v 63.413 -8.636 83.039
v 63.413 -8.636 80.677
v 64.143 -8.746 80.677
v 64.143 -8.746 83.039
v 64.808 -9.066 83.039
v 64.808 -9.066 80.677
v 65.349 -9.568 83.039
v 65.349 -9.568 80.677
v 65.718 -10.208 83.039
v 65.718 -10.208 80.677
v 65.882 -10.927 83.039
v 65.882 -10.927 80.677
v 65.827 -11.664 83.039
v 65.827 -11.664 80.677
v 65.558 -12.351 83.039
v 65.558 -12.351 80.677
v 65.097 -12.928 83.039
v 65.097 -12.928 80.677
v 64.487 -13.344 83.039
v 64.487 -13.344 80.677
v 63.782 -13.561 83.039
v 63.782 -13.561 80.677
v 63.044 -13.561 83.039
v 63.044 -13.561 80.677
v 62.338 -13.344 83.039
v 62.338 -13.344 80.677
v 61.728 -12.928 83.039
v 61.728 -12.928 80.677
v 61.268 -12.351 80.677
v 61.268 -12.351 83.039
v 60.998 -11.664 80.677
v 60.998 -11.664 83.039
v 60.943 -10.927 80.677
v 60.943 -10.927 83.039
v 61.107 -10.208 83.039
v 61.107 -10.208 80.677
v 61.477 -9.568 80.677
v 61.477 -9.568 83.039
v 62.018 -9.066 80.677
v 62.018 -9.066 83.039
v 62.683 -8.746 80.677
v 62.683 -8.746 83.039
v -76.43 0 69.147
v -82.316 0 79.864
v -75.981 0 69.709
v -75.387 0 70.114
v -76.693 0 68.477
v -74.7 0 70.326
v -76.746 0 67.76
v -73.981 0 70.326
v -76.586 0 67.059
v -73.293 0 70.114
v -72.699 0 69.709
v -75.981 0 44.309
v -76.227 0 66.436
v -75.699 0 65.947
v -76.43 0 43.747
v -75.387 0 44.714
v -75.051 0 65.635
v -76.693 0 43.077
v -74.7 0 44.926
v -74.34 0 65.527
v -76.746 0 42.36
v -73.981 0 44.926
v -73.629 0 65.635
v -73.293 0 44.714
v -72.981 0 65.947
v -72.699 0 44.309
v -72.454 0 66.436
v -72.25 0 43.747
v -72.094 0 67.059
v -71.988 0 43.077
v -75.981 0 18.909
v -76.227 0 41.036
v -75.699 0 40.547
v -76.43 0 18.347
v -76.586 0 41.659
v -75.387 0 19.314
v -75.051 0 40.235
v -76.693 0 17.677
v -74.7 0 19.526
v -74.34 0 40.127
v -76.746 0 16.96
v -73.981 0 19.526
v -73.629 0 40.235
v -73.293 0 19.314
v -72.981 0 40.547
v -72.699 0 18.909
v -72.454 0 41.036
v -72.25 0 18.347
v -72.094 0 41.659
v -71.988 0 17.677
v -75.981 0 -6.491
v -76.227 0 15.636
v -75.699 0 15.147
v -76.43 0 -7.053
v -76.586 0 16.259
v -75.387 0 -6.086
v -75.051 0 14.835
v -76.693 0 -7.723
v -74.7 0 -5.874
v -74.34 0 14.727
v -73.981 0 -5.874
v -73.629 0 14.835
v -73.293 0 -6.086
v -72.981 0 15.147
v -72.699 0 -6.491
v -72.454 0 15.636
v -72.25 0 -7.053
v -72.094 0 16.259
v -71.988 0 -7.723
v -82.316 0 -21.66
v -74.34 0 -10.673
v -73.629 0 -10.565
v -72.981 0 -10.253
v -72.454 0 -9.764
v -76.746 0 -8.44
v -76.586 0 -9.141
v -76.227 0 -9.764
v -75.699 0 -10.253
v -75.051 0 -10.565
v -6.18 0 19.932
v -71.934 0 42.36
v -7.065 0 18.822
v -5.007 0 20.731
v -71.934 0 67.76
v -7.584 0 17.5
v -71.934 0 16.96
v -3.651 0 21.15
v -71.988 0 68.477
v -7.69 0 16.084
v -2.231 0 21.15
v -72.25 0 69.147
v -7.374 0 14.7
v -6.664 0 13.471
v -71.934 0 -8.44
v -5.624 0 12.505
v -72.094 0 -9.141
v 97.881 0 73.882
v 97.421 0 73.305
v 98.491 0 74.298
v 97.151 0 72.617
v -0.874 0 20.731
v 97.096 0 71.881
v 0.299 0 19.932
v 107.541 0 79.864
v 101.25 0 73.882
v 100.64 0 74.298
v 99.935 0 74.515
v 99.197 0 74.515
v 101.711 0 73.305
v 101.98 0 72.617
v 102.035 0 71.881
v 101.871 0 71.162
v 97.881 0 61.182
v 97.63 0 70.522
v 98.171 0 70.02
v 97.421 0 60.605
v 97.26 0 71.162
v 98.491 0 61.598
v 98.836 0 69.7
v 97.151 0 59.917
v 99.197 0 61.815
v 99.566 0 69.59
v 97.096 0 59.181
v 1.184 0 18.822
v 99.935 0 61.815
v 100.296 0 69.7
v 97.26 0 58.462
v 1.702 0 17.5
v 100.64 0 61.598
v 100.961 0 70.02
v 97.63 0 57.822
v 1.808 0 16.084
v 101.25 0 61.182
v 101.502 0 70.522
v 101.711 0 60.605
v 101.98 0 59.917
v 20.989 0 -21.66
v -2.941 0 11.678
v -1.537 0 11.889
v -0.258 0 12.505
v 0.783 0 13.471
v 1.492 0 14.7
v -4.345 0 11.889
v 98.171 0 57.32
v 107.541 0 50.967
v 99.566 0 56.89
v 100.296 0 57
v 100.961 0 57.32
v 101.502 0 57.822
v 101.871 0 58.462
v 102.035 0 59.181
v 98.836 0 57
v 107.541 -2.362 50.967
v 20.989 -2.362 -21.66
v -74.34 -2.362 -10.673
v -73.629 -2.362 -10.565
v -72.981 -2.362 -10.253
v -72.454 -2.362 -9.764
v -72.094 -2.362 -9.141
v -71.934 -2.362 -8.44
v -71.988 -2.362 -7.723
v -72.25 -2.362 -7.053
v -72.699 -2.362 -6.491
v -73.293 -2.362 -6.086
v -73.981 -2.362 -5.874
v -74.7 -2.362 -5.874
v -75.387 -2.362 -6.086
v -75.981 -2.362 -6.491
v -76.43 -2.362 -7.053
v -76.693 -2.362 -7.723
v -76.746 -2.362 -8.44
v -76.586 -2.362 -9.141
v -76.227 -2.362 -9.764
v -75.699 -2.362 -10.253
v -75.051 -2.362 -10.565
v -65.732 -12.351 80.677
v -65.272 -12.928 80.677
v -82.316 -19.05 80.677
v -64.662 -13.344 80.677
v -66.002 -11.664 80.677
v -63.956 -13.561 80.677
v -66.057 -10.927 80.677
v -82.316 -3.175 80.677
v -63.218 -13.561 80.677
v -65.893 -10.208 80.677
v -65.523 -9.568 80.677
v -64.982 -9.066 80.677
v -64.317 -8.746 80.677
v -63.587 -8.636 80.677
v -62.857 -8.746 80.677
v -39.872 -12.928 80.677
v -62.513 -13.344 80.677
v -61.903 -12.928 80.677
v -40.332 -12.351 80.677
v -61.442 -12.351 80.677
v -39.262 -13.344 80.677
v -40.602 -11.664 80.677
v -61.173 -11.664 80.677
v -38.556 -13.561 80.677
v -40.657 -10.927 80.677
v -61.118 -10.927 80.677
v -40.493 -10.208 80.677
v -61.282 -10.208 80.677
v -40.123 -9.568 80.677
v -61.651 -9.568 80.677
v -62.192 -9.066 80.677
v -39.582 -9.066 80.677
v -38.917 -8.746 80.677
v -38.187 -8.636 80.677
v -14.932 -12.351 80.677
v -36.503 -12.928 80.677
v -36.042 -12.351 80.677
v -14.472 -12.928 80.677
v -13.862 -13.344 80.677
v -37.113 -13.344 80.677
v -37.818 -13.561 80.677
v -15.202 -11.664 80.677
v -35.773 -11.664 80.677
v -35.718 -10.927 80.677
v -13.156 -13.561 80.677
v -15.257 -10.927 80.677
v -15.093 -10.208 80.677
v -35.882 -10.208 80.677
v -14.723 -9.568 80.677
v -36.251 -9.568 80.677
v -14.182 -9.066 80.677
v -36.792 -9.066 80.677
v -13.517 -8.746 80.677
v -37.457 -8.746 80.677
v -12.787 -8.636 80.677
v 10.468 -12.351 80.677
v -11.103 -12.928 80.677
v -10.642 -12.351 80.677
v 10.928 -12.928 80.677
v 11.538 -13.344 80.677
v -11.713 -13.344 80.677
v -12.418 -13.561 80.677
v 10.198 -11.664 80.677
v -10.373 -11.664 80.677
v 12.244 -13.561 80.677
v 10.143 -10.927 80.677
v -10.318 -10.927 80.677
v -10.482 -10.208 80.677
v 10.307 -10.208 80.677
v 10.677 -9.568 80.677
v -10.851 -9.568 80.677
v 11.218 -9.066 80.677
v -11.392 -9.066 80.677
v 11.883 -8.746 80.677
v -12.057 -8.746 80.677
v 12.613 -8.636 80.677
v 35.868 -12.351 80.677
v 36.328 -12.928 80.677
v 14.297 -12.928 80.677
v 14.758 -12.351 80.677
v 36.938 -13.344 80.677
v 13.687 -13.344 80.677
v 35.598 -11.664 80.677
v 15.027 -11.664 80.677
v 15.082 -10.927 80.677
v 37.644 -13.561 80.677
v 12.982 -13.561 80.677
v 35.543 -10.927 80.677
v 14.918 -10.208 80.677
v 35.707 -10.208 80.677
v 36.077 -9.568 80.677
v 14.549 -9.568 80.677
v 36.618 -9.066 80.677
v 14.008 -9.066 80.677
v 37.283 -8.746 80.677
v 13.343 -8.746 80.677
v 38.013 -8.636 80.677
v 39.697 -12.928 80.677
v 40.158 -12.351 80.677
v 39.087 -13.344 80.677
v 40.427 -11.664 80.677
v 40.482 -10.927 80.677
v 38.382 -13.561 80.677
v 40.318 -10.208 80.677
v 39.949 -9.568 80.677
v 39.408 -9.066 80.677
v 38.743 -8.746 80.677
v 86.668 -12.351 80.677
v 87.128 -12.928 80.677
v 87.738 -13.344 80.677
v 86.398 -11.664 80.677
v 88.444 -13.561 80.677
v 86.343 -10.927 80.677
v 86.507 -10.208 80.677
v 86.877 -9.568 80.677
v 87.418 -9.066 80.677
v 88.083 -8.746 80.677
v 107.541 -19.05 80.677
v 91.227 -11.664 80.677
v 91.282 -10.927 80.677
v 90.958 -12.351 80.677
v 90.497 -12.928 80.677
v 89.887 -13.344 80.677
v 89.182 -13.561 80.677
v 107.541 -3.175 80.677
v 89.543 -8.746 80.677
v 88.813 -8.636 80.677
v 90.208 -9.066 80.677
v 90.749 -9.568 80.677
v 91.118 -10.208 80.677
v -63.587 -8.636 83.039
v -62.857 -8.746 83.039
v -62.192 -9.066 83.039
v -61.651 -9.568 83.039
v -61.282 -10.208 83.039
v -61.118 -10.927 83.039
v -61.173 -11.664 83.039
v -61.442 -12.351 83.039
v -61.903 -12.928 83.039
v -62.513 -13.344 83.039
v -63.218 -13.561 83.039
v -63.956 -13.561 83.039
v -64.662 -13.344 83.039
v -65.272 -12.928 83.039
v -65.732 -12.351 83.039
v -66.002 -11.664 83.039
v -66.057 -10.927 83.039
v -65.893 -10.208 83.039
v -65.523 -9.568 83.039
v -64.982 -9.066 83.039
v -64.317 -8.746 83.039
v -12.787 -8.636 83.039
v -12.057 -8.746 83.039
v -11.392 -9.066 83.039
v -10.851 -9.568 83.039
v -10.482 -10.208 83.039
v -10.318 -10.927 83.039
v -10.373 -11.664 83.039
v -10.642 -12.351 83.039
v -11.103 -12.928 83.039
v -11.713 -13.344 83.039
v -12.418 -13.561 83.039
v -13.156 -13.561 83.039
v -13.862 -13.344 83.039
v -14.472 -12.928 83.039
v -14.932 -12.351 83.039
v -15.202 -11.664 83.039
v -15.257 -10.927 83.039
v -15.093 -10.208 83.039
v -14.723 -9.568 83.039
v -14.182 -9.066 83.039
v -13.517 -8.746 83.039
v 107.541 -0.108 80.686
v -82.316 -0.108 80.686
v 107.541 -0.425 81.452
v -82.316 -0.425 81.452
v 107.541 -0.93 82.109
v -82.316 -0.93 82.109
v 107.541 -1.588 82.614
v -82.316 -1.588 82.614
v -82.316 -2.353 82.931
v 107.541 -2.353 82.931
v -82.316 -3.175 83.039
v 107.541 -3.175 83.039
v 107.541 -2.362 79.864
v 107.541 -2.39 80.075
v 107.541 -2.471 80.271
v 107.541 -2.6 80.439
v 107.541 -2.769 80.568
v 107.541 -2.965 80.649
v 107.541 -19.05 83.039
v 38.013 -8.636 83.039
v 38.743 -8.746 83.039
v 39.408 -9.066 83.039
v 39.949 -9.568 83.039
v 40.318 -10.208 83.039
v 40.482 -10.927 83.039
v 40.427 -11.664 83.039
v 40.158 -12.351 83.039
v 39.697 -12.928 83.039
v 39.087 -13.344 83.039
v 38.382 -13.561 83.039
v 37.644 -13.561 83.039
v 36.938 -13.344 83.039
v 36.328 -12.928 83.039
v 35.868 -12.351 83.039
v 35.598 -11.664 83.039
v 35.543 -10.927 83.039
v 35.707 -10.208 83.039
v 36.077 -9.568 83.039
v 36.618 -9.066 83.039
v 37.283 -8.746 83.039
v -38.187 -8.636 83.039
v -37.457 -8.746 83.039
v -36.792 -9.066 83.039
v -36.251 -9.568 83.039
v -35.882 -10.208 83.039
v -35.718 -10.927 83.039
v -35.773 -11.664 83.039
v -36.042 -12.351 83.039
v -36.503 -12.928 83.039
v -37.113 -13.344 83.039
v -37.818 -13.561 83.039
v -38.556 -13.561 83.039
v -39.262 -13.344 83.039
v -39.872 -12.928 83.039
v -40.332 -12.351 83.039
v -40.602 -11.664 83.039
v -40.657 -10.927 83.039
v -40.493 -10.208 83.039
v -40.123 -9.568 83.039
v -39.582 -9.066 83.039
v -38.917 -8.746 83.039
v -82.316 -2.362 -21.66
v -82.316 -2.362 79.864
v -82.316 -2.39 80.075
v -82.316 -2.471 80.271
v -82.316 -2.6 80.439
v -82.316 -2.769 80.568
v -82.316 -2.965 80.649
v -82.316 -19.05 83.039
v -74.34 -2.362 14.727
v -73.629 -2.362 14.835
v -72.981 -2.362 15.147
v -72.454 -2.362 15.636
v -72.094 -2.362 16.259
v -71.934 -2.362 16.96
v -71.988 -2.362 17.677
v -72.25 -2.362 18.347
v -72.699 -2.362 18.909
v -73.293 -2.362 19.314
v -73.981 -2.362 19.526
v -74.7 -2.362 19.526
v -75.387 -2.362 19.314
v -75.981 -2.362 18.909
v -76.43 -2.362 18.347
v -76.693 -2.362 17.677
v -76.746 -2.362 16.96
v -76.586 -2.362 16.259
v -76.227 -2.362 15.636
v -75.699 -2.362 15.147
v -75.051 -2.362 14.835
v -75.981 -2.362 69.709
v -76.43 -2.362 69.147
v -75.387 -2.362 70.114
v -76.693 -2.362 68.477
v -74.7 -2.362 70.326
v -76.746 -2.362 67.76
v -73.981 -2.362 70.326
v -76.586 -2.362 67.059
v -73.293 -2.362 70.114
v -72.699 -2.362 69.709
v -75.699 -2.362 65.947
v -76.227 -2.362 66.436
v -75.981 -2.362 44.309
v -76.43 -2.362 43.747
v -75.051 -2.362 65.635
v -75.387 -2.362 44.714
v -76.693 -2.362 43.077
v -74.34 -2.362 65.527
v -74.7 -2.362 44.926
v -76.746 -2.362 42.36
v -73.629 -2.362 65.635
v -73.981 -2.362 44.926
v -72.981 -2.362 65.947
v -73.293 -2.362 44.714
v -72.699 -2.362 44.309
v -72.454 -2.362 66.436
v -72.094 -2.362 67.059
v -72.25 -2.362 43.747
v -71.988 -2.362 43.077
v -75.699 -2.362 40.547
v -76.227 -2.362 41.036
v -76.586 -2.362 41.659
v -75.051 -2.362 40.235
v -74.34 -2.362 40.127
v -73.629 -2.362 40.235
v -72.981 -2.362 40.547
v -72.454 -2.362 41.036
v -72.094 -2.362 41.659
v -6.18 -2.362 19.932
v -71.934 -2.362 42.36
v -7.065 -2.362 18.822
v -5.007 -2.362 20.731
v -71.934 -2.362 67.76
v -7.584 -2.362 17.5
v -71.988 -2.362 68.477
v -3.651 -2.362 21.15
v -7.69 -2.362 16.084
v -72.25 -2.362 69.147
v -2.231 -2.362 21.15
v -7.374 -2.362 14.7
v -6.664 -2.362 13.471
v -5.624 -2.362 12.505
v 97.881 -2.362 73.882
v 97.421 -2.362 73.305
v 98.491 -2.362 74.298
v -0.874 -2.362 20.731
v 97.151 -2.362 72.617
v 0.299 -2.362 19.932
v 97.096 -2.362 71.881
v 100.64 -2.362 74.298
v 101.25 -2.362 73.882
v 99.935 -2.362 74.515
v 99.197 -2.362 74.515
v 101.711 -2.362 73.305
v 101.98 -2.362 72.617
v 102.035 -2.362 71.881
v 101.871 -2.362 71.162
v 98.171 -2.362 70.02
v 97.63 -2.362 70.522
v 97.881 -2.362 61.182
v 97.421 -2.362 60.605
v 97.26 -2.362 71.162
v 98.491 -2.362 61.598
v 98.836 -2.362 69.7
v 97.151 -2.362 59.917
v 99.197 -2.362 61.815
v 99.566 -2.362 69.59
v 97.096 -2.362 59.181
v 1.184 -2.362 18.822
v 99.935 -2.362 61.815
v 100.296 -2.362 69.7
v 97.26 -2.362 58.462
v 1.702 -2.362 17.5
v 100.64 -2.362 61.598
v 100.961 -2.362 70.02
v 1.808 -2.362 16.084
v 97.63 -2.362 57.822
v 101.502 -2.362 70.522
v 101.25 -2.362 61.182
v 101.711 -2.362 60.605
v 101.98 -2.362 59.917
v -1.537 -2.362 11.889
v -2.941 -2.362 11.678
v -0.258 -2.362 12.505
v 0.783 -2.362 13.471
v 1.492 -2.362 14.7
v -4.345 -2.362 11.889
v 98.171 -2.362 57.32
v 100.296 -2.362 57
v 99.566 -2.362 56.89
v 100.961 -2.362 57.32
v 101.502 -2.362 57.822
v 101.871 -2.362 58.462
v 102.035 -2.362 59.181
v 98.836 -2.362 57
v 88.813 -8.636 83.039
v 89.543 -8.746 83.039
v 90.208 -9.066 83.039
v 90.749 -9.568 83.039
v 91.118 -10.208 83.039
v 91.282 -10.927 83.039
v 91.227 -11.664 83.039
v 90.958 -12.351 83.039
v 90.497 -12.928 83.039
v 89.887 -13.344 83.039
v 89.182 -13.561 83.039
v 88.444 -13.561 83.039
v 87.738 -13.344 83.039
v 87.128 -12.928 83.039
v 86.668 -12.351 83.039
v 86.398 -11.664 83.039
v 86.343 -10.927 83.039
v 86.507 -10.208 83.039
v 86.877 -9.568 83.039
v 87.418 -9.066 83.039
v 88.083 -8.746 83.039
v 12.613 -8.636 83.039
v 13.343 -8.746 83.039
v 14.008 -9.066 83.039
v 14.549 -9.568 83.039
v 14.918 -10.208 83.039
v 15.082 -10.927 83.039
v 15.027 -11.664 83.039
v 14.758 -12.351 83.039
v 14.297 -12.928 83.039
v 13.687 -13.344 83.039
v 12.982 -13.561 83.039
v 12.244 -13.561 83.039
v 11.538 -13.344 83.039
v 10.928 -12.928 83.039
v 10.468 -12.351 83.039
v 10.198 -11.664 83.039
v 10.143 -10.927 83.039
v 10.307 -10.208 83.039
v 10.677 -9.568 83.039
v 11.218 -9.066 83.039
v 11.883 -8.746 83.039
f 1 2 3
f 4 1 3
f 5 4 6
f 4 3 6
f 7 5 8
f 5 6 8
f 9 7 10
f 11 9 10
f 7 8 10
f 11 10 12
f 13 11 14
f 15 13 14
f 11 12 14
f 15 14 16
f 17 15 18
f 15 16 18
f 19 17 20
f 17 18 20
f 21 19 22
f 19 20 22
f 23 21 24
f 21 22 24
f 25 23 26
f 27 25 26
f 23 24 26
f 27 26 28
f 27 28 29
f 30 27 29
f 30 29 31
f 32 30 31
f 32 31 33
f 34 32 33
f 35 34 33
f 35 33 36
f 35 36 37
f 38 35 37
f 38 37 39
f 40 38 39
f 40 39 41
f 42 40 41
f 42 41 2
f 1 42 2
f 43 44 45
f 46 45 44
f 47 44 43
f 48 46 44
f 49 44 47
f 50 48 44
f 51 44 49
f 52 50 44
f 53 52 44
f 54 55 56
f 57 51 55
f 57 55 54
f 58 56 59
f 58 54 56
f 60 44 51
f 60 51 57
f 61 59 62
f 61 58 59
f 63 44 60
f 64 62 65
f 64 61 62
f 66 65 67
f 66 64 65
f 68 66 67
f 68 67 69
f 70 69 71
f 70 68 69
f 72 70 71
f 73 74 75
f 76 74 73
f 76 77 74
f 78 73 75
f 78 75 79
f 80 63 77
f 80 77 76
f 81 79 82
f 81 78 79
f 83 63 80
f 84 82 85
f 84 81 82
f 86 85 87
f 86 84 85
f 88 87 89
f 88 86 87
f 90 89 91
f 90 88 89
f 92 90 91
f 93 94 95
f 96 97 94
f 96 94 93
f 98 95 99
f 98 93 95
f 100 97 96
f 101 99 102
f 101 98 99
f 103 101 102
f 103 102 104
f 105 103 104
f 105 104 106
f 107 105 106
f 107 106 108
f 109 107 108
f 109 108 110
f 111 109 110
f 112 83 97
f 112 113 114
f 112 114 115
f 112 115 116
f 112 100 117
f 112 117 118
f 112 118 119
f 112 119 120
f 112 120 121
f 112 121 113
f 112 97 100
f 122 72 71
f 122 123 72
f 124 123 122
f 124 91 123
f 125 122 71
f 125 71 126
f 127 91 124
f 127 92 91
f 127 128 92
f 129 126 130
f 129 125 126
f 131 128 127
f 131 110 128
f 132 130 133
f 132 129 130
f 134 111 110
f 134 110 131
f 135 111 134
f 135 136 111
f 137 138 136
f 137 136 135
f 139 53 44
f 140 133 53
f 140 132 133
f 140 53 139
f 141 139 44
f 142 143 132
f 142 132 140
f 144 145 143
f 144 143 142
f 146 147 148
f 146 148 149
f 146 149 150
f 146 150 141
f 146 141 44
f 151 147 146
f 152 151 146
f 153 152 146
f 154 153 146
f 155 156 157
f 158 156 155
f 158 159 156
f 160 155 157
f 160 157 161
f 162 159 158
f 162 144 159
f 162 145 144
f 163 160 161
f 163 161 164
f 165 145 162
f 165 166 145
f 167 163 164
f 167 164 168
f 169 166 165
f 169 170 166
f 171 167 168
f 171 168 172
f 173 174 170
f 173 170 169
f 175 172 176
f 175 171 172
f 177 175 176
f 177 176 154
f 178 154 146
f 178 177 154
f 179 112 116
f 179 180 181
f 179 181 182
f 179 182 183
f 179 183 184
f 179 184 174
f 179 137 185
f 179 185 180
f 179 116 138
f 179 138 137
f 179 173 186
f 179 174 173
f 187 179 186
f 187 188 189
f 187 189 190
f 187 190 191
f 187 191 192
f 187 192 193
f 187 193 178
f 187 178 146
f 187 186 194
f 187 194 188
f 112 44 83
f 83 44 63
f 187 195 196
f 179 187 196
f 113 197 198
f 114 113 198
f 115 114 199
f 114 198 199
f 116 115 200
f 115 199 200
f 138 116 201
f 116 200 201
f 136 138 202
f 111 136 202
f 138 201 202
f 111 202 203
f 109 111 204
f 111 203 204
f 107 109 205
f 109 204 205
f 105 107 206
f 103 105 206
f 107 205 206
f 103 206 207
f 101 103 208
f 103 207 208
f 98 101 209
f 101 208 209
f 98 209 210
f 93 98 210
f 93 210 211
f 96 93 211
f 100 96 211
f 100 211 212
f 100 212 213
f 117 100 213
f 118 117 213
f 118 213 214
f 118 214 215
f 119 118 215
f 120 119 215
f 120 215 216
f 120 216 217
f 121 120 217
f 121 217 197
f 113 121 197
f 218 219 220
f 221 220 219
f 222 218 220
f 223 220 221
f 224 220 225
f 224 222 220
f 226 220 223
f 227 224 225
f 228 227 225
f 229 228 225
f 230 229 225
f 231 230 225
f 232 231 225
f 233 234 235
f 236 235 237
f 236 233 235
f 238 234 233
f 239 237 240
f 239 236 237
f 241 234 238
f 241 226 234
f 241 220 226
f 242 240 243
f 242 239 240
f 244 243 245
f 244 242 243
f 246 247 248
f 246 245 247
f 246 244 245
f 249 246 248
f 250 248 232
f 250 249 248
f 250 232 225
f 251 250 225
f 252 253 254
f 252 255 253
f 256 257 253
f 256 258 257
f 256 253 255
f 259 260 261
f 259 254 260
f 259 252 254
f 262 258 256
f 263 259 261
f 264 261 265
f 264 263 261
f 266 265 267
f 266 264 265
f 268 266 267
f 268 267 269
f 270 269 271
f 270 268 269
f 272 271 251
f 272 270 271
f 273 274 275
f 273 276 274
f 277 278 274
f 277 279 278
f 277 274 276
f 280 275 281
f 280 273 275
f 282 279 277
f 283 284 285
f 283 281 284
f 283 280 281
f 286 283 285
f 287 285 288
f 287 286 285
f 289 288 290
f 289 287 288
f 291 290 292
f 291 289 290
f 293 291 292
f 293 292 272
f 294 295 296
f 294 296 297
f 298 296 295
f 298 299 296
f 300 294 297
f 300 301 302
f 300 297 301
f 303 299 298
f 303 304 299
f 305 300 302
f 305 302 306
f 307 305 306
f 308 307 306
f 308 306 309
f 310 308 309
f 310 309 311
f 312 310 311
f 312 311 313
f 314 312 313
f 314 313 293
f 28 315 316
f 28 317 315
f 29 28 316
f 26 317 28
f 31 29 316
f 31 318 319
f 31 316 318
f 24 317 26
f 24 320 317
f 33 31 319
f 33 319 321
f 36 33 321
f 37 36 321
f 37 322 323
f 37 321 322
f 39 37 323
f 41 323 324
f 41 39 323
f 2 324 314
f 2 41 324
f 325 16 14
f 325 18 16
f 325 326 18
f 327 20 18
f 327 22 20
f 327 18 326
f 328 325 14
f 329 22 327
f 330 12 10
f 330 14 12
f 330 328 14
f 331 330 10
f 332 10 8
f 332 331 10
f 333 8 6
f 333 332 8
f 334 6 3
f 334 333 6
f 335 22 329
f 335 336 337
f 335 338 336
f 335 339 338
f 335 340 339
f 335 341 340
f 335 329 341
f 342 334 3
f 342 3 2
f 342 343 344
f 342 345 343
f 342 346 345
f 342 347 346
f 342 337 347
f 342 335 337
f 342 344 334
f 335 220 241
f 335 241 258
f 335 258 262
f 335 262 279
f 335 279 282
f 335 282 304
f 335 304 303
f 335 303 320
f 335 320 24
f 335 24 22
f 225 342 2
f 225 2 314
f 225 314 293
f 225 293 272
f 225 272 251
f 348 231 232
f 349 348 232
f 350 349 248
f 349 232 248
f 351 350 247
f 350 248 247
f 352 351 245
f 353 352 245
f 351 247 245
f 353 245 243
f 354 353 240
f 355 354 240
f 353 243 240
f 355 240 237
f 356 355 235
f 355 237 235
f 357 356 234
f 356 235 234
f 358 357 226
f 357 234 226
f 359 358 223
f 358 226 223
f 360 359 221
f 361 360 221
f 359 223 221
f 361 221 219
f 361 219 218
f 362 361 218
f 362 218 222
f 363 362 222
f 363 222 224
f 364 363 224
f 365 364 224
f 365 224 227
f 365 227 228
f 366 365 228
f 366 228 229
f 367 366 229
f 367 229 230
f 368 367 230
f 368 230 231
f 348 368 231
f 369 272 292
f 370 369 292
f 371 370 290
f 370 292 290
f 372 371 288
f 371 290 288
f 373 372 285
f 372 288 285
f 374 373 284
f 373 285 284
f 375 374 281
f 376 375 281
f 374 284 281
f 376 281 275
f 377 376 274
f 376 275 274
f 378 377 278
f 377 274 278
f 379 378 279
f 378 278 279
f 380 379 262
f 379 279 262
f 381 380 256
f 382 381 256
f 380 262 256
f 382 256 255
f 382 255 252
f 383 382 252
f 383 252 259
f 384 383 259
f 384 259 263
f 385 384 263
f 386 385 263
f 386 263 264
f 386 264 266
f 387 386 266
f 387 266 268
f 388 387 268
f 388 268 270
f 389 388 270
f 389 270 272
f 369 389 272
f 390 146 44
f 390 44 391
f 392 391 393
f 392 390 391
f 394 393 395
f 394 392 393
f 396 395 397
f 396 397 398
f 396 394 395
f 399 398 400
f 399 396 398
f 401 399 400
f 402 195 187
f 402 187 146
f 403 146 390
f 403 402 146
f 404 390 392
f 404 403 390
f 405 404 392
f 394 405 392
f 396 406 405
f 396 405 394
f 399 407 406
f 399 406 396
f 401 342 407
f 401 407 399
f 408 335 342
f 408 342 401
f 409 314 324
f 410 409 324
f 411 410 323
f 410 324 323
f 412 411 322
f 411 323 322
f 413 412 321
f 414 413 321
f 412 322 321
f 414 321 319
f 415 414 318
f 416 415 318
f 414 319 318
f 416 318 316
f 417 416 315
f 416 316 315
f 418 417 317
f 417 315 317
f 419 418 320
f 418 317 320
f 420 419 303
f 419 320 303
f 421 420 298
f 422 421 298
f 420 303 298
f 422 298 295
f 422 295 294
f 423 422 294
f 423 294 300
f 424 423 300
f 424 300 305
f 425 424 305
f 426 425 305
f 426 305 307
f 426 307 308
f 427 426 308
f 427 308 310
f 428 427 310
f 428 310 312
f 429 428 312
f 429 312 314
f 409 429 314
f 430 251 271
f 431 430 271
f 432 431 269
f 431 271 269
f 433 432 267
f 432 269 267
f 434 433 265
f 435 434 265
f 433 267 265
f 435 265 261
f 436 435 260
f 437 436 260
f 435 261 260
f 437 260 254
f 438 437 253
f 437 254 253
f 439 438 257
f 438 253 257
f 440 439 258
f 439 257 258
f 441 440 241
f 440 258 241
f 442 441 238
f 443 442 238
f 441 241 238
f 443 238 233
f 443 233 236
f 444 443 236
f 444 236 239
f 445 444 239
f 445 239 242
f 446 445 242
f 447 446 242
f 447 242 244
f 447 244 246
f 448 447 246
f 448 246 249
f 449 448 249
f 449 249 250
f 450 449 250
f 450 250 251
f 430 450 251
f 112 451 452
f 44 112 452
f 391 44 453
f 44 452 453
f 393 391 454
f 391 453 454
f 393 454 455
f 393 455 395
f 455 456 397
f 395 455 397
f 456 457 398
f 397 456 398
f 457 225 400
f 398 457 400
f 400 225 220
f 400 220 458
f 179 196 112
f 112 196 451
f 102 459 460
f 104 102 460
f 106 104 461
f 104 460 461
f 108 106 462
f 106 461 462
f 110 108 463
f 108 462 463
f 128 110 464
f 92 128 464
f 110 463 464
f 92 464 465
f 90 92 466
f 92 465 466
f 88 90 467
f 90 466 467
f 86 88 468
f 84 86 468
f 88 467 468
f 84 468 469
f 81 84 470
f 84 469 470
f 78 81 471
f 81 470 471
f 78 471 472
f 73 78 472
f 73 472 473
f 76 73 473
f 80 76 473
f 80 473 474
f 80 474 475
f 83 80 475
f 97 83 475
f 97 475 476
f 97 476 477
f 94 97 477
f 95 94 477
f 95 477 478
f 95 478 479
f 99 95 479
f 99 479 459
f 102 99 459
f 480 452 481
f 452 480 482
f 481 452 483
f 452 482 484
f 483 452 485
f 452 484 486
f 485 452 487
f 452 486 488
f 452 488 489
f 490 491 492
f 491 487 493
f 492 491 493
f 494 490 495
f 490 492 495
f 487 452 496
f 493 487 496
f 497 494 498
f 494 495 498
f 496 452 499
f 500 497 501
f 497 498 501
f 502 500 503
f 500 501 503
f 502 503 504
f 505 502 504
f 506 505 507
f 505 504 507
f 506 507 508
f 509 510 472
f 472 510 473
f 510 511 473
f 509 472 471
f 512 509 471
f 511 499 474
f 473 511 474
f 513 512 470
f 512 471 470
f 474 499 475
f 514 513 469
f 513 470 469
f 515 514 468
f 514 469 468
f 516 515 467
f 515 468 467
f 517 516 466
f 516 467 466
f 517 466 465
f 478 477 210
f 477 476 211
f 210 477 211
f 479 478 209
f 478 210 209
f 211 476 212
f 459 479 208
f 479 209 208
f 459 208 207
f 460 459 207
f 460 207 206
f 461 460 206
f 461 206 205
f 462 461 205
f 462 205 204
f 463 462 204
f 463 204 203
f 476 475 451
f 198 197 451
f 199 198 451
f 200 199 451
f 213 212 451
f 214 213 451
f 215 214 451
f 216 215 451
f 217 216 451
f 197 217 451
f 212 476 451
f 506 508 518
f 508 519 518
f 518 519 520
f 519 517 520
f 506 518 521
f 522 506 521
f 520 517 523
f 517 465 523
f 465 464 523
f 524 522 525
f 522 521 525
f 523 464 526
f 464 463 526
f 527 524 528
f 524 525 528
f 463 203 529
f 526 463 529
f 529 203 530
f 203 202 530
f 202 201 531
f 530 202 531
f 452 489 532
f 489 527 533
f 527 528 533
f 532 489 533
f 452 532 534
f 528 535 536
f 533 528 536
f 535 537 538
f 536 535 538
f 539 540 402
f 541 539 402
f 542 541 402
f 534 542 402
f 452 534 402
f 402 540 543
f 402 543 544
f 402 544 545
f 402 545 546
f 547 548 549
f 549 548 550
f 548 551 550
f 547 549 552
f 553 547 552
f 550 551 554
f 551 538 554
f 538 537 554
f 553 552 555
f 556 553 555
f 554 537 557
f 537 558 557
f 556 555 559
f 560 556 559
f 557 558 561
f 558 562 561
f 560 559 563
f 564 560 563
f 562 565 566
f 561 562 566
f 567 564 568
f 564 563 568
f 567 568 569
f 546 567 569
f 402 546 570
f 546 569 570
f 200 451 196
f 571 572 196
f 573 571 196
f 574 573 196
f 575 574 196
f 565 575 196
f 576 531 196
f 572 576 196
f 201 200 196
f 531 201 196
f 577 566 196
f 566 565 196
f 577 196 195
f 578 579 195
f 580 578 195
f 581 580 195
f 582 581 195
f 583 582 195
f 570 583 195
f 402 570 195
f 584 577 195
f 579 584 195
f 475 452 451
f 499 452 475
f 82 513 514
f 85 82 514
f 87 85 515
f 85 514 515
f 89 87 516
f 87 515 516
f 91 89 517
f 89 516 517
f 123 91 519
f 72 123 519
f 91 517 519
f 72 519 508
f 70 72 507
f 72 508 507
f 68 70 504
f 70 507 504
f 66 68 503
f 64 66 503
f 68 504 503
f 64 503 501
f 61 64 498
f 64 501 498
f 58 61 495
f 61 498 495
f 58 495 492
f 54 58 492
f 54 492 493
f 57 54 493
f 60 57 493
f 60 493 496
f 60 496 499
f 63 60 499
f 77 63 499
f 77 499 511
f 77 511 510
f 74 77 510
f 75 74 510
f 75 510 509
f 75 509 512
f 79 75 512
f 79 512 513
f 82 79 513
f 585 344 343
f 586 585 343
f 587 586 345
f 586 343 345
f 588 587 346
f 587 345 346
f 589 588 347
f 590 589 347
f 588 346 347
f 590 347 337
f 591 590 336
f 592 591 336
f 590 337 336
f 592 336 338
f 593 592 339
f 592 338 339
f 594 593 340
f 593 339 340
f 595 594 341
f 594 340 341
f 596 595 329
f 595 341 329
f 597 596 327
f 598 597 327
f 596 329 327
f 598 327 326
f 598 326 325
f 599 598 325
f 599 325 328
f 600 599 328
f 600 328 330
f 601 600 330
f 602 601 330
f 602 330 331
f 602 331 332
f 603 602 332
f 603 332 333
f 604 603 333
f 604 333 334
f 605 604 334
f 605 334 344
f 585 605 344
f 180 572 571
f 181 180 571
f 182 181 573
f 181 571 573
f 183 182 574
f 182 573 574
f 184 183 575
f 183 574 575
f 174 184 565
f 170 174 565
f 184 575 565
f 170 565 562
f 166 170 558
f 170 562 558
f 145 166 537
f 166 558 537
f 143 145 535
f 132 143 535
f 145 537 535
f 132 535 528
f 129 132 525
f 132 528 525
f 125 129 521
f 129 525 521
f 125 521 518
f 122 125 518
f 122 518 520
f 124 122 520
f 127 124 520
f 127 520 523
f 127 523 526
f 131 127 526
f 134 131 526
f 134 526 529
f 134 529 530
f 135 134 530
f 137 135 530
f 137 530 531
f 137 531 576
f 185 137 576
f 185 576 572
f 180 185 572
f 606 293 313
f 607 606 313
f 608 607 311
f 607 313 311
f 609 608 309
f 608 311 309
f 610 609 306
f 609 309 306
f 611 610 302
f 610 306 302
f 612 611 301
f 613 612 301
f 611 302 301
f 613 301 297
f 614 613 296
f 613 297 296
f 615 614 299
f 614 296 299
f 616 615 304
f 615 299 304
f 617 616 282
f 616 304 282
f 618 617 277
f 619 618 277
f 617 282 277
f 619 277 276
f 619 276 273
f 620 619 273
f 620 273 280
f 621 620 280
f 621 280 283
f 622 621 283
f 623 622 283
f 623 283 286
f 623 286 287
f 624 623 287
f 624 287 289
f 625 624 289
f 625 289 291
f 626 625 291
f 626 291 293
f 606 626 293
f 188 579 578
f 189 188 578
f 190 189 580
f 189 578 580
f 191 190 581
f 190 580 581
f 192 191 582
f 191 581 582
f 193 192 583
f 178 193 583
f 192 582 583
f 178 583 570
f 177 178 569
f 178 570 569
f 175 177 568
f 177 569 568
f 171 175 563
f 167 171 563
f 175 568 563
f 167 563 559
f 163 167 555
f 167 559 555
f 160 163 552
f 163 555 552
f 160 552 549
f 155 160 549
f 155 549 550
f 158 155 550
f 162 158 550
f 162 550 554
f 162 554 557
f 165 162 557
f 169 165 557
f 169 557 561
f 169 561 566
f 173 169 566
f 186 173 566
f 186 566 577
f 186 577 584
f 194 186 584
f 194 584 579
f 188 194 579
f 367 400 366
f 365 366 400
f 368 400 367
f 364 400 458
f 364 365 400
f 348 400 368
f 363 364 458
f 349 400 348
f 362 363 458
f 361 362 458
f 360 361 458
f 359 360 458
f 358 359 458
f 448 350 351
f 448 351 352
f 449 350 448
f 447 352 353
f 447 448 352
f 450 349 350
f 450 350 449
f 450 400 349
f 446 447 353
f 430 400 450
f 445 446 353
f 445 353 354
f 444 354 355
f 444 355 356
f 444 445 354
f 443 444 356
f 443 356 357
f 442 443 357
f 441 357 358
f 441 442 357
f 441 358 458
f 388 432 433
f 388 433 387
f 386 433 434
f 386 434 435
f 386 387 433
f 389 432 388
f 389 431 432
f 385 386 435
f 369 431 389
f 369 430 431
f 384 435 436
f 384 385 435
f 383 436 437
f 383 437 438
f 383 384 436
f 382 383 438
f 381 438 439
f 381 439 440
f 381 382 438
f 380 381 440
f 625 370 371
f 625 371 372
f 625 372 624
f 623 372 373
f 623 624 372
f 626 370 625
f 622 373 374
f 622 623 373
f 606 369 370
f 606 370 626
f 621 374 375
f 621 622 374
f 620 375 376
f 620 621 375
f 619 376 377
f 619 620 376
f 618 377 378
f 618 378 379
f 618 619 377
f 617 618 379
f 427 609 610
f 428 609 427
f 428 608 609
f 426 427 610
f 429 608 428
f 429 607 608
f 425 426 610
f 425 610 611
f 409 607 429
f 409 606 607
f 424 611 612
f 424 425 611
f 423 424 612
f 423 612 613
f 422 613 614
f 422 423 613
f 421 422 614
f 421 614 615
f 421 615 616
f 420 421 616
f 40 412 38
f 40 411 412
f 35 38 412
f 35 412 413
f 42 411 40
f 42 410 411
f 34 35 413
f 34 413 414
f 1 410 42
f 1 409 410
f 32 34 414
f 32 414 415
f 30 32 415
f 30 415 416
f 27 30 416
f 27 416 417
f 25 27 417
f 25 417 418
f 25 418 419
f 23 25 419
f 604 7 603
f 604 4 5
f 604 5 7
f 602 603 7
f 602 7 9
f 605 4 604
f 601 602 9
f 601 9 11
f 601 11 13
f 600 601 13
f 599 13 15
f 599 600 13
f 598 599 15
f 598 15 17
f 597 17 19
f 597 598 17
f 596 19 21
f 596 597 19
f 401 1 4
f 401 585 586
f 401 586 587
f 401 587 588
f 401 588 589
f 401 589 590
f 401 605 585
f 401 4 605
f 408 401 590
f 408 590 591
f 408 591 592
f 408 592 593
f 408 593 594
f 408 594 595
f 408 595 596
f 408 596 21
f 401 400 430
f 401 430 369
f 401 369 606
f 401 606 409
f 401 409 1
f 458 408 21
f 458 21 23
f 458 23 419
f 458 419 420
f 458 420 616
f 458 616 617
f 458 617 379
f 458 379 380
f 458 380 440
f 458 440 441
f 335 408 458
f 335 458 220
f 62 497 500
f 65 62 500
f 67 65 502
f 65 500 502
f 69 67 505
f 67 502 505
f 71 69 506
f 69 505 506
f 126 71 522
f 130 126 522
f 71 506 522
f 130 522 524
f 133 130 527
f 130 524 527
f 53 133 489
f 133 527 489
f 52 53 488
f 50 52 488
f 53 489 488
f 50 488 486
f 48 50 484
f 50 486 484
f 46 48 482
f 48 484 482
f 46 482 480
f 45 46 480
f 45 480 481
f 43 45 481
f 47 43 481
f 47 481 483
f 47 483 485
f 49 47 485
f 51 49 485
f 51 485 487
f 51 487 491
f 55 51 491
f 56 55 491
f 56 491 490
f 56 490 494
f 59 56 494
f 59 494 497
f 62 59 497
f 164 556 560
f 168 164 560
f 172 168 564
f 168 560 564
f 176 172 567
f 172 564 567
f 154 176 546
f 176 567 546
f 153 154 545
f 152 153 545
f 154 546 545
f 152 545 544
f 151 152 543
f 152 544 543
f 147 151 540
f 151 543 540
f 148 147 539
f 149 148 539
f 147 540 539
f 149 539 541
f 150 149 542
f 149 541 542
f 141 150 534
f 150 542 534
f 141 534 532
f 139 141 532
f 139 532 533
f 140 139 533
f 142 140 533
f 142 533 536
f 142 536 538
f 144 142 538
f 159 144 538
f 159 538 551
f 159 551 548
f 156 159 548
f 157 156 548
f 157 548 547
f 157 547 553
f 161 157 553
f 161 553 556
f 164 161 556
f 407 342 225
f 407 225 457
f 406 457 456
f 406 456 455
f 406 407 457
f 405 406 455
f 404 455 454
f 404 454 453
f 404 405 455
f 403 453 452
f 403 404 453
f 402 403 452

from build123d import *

# Parameters (mm, degrees)
SKETCH1_W                    = 189.8572
SKETCH1_H                    = 175.514
BASE_FLANGE1_DEPTH           = 2.3622
EDGE_FLANGE4_STRIP_W         = 11.0744
EDGE_FLANGE4_STRIP_H         = 2.3622
EDGE_FLANGE4_STRIP_CUT_DEPTH = 189.8572
EDGE_FLANGE4_DEPTH           = 189.8572
CUT_EXTRUDE1_DEPTH           = 145.352665205
CUT_EXTRUDE5_REACH           = 151.669
SKETCH41_R                   = 2.4765
CUT_EXTRUDE6_REACH           = 138.891
SKETCH42_R                   = 2.413
SKETCH42_R_2                 = 2.4765
CUT_EXTRUDE7_REACH           = 138.891
SKETCH43_R                   = 4.7625


# Sheet-metal steps are written as plain solids
with BuildPart() as part:
    # Sketch1 → Base-Flange1 (new body)
    with BuildSketch(Plane(origin=(0, 0, 0), x_dir=(1, 0, 0), z_dir=(0, 1, 0))):
        with Locations((12.6128, 7.08)):
            Rectangle(SKETCH1_W, SKETCH1_H)
    extrude(amount=-BASE_FLANGE1_DEPTH)

    # Edge-Flange4 strip (across the edge) → Edge-Flange4 strip cut (cut)
    with BuildSketch(Plane(origin=(107.5414, -2.3622, 80.677), x_dir=(0, 0, -1), z_dir=(-1, 0, 0))):
        with Locations((-4.7244, -1.1811)):
            Rectangle(EDGE_FLANGE4_STRIP_W, EDGE_FLANGE4_STRIP_H)
    extrude(amount=EDGE_FLANGE4_STRIP_CUT_DEPTH, mode=Mode.SUBTRACT)

    # Edge-Flange4 section (across the edge) → Edge-Flange4 (add)
    with BuildSketch(Plane(origin=(107.5414, -2.3622, 80.677), x_dir=(0, 0, -1), z_dir=(-1, 0, 0))):
        with BuildLine():
            Line((-2.3622, 0.8128), (-2.3622, 16.6878))
            Line((-2.3622, 16.6878), (0, 16.6878))
            Line((0, 16.6878), (0, 0.8128))
            ThreePointArc((0, 0.8128), (0.238063608, 0.238063608), (0.8128, 0))
            Line((0.8128, 0), (0.8128, -2.3622))
            ThreePointArc((0.8128, -2.3622), (-1.43226403, -1.43226403), (-2.3622, 0.8128))
        make_face()
    extrude(amount=EDGE_FLANGE4_DEPTH)

    # Sketch36 → Cut-Extrude1 (cut, through all)
    with BuildSketch(Plane.XZ.offset(2.3622)):
        Polygon((20.98856689, -21.6596), (-82.3158, -21.6596), (-82.3158, -94.837), (107.5414, -94.837), (107.5414, 50.96685034), align=None)
    extrude(amount=-CUT_EXTRUDE1_DEPTH, mode=Mode.SUBTRACT)

    # Sketch41 → Cut-Extrude5 (cut, up to next)
    with BuildSketch(Plane(origin=(0, 0, 80.677), x_dir=(-1, 0, 0), z_dir=(0, 0, -1)), mode=Mode.PRIVATE) as cut_extrude5_sk1:
        with Locations(Location((-88.8128, -11.1125, 0), (0, 0, 90))):
            Circle(SKETCH41_R)
    cut_extrude5_tool1 = extrude(cut_extrude5_sk1.sketch, amount=-CUT_EXTRUDE5_REACH, mode=Mode.PRIVATE) & part.part
    # Sketch41 → Cut-Extrude5 (cut, up to next)
    with BuildSketch(Plane(origin=(0, 0, 80.677), x_dir=(-1, 0, 0), z_dir=(0, 0, -1)), mode=Mode.PRIVATE) as cut_extrude5_sk2:
        with Locations(Location((-63.4128, -11.1125, 0), (0, 0, 90))):
            Circle(SKETCH41_R)
    cut_extrude5_tool2 = extrude(cut_extrude5_sk2.sketch, amount=-CUT_EXTRUDE5_REACH, mode=Mode.PRIVATE) & part.part
    # Sketch41 → Cut-Extrude5 (cut, up to next)
    with BuildSketch(Plane(origin=(0, 0, 80.677), x_dir=(-1, 0, 0), z_dir=(0, 0, -1)), mode=Mode.PRIVATE) as cut_extrude5_sk3:
        with Locations(Location((-38.0128, -11.1125, 0), (0, 0, 90))):
            Circle(SKETCH41_R)
    cut_extrude5_tool3 = extrude(cut_extrude5_sk3.sketch, amount=-CUT_EXTRUDE5_REACH, mode=Mode.PRIVATE) & part.part
    # Sketch41 → Cut-Extrude5 (cut, up to next)
    with BuildSketch(Plane(origin=(0, 0, 80.677), x_dir=(-1, 0, 0), z_dir=(0, 0, -1)), mode=Mode.PRIVATE) as cut_extrude5_sk4:
        with Locations(Location((-12.6128, -11.1125, 0), (0, 0, 90))):
            Circle(SKETCH41_R)
    cut_extrude5_tool4 = extrude(cut_extrude5_sk4.sketch, amount=-CUT_EXTRUDE5_REACH, mode=Mode.PRIVATE) & part.part
    # Sketch41 → Cut-Extrude5 (cut, up to next)
    with BuildSketch(Plane(origin=(0, 0, 80.677), x_dir=(-1, 0, 0), z_dir=(0, 0, -1)), mode=Mode.PRIVATE) as cut_extrude5_sk5:
        with Locations(Location((12.7872, -11.1125, 0), (0, 0, 90))):
            Circle(SKETCH41_R)
    cut_extrude5_tool5 = extrude(cut_extrude5_sk5.sketch, amount=-CUT_EXTRUDE5_REACH, mode=Mode.PRIVATE) & part.part
    # Sketch41 → Cut-Extrude5 (cut, up to next)
    with BuildSketch(Plane(origin=(0, 0, 80.677), x_dir=(-1, 0, 0), z_dir=(0, 0, -1)), mode=Mode.PRIVATE) as cut_extrude5_sk6:
        with Locations(Location((38.1872, -11.1125, 0), (0, 0, 90))):
            Circle(SKETCH41_R)
    cut_extrude5_tool6 = extrude(cut_extrude5_sk6.sketch, amount=-CUT_EXTRUDE5_REACH, mode=Mode.PRIVATE) & part.part
    # Sketch41 → Cut-Extrude5 (cut, up to next)
    with BuildSketch(Plane(origin=(0, 0, 80.677), x_dir=(-1, 0, 0), z_dir=(0, 0, -1)), mode=Mode.PRIVATE) as cut_extrude5_sk7:
        with Locations(Location((63.5872, -11.1125, 0), (0, 0, 90))):
            Circle(SKETCH41_R)
    cut_extrude5_tool7 = extrude(cut_extrude5_sk7.sketch, amount=-CUT_EXTRUDE5_REACH, mode=Mode.PRIVATE) & part.part
    add(cut_extrude5_tool1.solids().sort_by_distance((88.8128, -11.1125, 80.677))[0], mode=Mode.SUBTRACT)
    add(cut_extrude5_tool2.solids().sort_by_distance((63.4128, -11.1125, 80.677))[0], mode=Mode.SUBTRACT)
    add(cut_extrude5_tool3.solids().sort_by_distance((38.0128, -11.1125, 80.677))[0], mode=Mode.SUBTRACT)
    add(cut_extrude5_tool4.solids().sort_by_distance((12.6128, -11.1125, 80.677))[0], mode=Mode.SUBTRACT)
    add(cut_extrude5_tool5.solids().sort_by_distance((-12.7872, -11.1125, 80.677))[0], mode=Mode.SUBTRACT)
    add(cut_extrude5_tool6.solids().sort_by_distance((-38.1872, -11.1125, 80.677))[0], mode=Mode.SUBTRACT)
    add(cut_extrude5_tool7.solids().sort_by_distance((-63.5872, -11.1125, 80.677))[0], mode=Mode.SUBTRACT)

    # Sketch42 → Cut-Extrude6 (cut, up to next)
    with BuildSketch(Plane.XZ.offset(2.3622), mode=Mode.PRIVATE) as cut_extrude6_sk1:
        with Locations(Location((-74.3402, -8.2596, 0), (0, 0, 270))):
            Circle(SKETCH42_R)
    cut_extrude6_tool1 = extrude(cut_extrude6_sk1.sketch, amount=-CUT_EXTRUDE6_REACH, mode=Mode.PRIVATE) & part.part
    # Sketch42 → Cut-Extrude6 (cut, up to next)
    with BuildSketch(Plane.XZ.offset(2.3622), mode=Mode.PRIVATE) as cut_extrude6_sk2:
        with Locations(Location((-74.3402, 17.1404, 0), (0, 0, 270))):
            Circle(SKETCH42_R)
    cut_extrude6_tool2 = extrude(cut_extrude6_sk2.sketch, amount=-CUT_EXTRUDE6_REACH, mode=Mode.PRIVATE) & part.part
    # Sketch42 → Cut-Extrude6 (cut, up to next)
    with BuildSketch(Plane.XZ.offset(2.3622), mode=Mode.PRIVATE) as cut_extrude6_sk3:
        with Locations(Location((-74.3402, 42.5404, 0), (0, 0, 270))):
            Circle(SKETCH42_R)
    cut_extrude6_tool3 = extrude(cut_extrude6_sk3.sketch, amount=-CUT_EXTRUDE6_REACH, mode=Mode.PRIVATE) & part.part
    # Sketch42 → Cut-Extrude6 (cut, up to next)
    with BuildSketch(Plane.XZ.offset(2.3622), mode=Mode.PRIVATE) as cut_extrude6_sk4:
        with Locations(Location((-74.3402, 67.9404, 0), (0, 0, 270))):
            Circle(SKETCH42_R)
    cut_extrude6_tool4 = extrude(cut_extrude6_sk4.sketch, amount=-CUT_EXTRUDE6_REACH, mode=Mode.PRIVATE) & part.part
    # Sketch42 → Cut-Extrude6 (cut, up to next)
    with BuildSketch(Plane.XZ.offset(2.3622), mode=Mode.PRIVATE) as cut_extrude6_sk5:
        with Locations(Location((99.5658, 59.3664, 0), (0, 0, 270))):
            Circle(SKETCH42_R_2)
    cut_extrude6_tool5 = extrude(cut_extrude6_sk5.sketch, amount=-CUT_EXTRUDE6_REACH, mode=Mode.PRIVATE) & part.part
    # Sketch42 → Cut-Extrude6 (cut, up to next)
    with BuildSketch(Plane.XZ.offset(2.3622), mode=Mode.PRIVATE) as cut_extrude6_sk6:
        with Locations(Location((99.5658, 72.0664, 0), (0, 0, 270))):
            Circle(SKETCH42_R_2)
    cut_extrude6_tool6 = extrude(cut_extrude6_sk6.sketch, amount=-CUT_EXTRUDE6_REACH, mode=Mode.PRIVATE) & part.part
    add(cut_extrude6_tool1.solids().sort_by_distance((-74.3402, -2.3622, -8.2596))[0], mode=Mode.SUBTRACT)
    add(cut_extrude6_tool2.solids().sort_by_distance((-74.3402, -2.3622, 17.1404))[0], mode=Mode.SUBTRACT)
    add(cut_extrude6_tool3.solids().sort_by_distance((-74.3402, -2.3622, 42.5404))[0], mode=Mode.SUBTRACT)
    add(cut_extrude6_tool4.solids().sort_by_distance((-74.3402, -2.3622, 67.9404))[0], mode=Mode.SUBTRACT)
    add(cut_extrude6_tool5.solids().sort_by_distance((99.5658, -2.3622, 59.3664))[0], mode=Mode.SUBTRACT)
    add(cut_extrude6_tool6.solids().sort_by_distance((99.5658, -2.3622, 72.0664))[0], mode=Mode.SUBTRACT)

    # Sketch43 → Cut-Extrude7 (cut, up to next)
    with BuildSketch(Plane.XZ.offset(2.3622), mode=Mode.PRIVATE) as cut_extrude7_sk1:
        with Locations(Location((-2.9408, 16.4404, 0), (0, 0, 270))):
            Circle(SKETCH43_R)
    cut_extrude7_tool1 = extrude(cut_extrude7_sk1.sketch, amount=-CUT_EXTRUDE7_REACH, mode=Mode.PRIVATE) & part.part
    add(cut_extrude7_tool1.solids().sort_by_distance((-2.9408, -2.3622, 16.4404))[0], mode=Mode.SUBTRACT)


solid = part.part
